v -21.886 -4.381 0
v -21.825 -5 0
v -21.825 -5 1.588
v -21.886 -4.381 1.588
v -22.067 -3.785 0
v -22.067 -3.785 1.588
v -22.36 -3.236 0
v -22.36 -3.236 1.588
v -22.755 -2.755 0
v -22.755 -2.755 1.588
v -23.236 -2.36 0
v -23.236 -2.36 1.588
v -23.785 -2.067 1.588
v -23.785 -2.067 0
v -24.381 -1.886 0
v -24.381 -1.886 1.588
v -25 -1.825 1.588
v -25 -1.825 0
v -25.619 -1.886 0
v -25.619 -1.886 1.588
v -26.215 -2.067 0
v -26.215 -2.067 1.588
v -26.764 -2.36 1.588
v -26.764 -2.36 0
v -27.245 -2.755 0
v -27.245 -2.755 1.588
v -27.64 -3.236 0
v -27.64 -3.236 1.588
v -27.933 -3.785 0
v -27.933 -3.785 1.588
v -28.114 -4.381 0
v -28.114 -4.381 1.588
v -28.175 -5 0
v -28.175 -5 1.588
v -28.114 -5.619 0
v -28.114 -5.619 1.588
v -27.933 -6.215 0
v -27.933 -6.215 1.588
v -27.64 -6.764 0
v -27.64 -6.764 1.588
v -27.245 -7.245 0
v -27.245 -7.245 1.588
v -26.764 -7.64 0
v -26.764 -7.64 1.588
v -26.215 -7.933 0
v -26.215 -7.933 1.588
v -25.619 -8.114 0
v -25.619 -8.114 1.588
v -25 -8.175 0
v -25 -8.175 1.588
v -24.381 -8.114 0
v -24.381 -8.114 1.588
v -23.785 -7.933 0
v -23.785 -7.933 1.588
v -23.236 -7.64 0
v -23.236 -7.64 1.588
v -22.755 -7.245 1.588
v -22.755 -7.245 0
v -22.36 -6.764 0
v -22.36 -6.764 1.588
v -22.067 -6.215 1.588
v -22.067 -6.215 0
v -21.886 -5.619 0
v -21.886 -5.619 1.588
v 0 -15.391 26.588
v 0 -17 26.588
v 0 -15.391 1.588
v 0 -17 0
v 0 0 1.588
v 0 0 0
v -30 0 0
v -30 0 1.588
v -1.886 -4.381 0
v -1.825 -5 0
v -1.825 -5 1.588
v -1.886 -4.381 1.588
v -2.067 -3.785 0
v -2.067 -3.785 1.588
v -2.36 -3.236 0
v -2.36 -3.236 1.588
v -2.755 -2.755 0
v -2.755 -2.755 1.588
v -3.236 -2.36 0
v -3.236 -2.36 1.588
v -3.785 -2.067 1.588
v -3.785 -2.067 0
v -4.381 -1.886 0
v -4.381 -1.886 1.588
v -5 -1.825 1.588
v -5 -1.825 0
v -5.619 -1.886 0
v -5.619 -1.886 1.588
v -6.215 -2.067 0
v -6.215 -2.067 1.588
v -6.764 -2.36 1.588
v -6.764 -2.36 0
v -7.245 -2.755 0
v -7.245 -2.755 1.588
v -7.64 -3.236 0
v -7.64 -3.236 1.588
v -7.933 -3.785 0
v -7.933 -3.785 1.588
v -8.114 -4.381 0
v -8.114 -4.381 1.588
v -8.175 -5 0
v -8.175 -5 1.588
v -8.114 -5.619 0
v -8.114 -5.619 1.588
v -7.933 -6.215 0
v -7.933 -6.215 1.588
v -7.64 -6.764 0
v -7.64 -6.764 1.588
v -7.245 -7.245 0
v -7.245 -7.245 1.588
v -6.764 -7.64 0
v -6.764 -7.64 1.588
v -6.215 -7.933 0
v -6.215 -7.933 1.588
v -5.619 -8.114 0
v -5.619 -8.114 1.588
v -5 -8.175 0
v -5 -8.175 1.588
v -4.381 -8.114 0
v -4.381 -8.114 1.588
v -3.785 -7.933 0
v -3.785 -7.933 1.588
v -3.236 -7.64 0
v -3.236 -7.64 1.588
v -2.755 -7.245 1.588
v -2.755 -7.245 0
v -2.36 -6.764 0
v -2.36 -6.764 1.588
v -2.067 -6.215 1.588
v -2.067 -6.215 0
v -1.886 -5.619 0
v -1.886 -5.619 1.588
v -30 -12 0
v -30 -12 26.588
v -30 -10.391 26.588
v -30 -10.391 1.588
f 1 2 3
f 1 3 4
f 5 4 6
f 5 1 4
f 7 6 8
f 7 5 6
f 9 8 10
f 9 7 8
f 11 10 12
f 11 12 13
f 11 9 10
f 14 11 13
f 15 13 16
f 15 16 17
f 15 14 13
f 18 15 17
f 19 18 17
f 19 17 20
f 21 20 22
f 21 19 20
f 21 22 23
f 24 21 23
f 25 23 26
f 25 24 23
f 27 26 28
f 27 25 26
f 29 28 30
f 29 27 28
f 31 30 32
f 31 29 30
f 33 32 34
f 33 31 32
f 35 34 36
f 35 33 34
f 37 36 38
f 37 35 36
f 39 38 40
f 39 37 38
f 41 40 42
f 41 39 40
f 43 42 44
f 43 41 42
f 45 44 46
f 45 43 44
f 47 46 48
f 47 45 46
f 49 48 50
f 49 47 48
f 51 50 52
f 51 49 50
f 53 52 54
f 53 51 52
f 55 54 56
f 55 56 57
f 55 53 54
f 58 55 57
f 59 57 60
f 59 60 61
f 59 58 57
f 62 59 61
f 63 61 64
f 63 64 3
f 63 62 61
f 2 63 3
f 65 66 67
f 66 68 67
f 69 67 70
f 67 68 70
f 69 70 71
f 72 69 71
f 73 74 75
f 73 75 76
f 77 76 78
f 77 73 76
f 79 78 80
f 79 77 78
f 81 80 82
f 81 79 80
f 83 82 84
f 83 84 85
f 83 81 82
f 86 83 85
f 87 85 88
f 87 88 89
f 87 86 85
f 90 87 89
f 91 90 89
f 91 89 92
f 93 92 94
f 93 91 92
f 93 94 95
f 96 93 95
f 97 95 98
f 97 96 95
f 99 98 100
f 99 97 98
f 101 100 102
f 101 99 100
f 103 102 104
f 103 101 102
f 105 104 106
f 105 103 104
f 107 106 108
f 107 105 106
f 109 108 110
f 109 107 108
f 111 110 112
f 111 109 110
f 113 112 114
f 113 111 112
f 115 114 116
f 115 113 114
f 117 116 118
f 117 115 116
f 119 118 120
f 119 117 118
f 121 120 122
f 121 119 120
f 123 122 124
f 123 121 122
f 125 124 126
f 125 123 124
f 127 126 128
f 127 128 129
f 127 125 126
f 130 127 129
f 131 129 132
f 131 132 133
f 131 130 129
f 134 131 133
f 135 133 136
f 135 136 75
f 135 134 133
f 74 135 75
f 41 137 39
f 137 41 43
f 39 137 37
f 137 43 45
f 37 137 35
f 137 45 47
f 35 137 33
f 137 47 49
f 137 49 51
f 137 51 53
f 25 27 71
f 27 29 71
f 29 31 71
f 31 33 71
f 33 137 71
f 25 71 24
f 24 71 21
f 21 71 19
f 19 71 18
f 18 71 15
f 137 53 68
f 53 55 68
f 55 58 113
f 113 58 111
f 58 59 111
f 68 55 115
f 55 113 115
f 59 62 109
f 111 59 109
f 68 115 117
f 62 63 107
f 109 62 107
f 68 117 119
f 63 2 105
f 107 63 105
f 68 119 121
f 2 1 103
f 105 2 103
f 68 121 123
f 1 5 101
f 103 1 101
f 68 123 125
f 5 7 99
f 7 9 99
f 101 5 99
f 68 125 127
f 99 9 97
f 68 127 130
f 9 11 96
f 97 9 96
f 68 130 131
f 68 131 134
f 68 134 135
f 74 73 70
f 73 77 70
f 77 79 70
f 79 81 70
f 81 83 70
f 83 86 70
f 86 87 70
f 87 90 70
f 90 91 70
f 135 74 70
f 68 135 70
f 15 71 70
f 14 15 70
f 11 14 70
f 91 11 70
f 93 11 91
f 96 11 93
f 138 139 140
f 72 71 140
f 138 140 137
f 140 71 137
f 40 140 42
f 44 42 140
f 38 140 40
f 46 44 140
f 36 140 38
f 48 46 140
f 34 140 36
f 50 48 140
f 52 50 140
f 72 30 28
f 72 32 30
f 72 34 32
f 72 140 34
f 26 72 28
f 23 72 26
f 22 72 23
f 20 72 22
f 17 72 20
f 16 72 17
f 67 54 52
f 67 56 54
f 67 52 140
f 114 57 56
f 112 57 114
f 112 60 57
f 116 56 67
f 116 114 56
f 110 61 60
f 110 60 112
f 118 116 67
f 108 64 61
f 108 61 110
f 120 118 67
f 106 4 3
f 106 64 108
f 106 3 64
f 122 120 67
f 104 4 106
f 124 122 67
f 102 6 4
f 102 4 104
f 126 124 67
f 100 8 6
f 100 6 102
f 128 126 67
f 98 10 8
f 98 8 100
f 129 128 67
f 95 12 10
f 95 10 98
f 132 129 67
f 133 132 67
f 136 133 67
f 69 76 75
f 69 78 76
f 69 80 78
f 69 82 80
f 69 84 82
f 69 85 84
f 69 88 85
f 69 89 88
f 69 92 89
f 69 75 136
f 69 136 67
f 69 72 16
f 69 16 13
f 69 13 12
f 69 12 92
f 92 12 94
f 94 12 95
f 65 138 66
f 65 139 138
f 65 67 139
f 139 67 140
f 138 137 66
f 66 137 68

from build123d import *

# Parameters (mm, degrees)
CROQUIS3_R              = 3.175
SALIENTE_EXTRUIR2_DEPTH = 1.5875
SALIENTE_EXTRUIR3_DEPTH = 25


with BuildPart() as part:
    # Croquis3 → Saliente-Extruir2 (new body)
    with BuildSketch(Plane.XY):
        Polygon((0, -17), (0, 0), (-30, 0), (-30, -12), align=None)
        with Locations((-25, -5)):
            Circle(CROQUIS3_R, mode=Mode.SUBTRACT)
        with Locations((-5, -5)):
            Circle(CROQUIS3_R, mode=Mode.SUBTRACT)
    extrude(amount=SALIENTE_EXTRUIR2_DEPTH)

    # Croquis4 → Saliente-Extruir3 (add)
    with BuildSketch(Plane.XY.offset(1.5875)):
        Polygon((-30, -12), (0, -17), (0, -15.390602414), (-30, -10.390602414), align=None)
    extrude(amount=SALIENTE_EXTRUIR3_DEPTH)


solid = part.part
